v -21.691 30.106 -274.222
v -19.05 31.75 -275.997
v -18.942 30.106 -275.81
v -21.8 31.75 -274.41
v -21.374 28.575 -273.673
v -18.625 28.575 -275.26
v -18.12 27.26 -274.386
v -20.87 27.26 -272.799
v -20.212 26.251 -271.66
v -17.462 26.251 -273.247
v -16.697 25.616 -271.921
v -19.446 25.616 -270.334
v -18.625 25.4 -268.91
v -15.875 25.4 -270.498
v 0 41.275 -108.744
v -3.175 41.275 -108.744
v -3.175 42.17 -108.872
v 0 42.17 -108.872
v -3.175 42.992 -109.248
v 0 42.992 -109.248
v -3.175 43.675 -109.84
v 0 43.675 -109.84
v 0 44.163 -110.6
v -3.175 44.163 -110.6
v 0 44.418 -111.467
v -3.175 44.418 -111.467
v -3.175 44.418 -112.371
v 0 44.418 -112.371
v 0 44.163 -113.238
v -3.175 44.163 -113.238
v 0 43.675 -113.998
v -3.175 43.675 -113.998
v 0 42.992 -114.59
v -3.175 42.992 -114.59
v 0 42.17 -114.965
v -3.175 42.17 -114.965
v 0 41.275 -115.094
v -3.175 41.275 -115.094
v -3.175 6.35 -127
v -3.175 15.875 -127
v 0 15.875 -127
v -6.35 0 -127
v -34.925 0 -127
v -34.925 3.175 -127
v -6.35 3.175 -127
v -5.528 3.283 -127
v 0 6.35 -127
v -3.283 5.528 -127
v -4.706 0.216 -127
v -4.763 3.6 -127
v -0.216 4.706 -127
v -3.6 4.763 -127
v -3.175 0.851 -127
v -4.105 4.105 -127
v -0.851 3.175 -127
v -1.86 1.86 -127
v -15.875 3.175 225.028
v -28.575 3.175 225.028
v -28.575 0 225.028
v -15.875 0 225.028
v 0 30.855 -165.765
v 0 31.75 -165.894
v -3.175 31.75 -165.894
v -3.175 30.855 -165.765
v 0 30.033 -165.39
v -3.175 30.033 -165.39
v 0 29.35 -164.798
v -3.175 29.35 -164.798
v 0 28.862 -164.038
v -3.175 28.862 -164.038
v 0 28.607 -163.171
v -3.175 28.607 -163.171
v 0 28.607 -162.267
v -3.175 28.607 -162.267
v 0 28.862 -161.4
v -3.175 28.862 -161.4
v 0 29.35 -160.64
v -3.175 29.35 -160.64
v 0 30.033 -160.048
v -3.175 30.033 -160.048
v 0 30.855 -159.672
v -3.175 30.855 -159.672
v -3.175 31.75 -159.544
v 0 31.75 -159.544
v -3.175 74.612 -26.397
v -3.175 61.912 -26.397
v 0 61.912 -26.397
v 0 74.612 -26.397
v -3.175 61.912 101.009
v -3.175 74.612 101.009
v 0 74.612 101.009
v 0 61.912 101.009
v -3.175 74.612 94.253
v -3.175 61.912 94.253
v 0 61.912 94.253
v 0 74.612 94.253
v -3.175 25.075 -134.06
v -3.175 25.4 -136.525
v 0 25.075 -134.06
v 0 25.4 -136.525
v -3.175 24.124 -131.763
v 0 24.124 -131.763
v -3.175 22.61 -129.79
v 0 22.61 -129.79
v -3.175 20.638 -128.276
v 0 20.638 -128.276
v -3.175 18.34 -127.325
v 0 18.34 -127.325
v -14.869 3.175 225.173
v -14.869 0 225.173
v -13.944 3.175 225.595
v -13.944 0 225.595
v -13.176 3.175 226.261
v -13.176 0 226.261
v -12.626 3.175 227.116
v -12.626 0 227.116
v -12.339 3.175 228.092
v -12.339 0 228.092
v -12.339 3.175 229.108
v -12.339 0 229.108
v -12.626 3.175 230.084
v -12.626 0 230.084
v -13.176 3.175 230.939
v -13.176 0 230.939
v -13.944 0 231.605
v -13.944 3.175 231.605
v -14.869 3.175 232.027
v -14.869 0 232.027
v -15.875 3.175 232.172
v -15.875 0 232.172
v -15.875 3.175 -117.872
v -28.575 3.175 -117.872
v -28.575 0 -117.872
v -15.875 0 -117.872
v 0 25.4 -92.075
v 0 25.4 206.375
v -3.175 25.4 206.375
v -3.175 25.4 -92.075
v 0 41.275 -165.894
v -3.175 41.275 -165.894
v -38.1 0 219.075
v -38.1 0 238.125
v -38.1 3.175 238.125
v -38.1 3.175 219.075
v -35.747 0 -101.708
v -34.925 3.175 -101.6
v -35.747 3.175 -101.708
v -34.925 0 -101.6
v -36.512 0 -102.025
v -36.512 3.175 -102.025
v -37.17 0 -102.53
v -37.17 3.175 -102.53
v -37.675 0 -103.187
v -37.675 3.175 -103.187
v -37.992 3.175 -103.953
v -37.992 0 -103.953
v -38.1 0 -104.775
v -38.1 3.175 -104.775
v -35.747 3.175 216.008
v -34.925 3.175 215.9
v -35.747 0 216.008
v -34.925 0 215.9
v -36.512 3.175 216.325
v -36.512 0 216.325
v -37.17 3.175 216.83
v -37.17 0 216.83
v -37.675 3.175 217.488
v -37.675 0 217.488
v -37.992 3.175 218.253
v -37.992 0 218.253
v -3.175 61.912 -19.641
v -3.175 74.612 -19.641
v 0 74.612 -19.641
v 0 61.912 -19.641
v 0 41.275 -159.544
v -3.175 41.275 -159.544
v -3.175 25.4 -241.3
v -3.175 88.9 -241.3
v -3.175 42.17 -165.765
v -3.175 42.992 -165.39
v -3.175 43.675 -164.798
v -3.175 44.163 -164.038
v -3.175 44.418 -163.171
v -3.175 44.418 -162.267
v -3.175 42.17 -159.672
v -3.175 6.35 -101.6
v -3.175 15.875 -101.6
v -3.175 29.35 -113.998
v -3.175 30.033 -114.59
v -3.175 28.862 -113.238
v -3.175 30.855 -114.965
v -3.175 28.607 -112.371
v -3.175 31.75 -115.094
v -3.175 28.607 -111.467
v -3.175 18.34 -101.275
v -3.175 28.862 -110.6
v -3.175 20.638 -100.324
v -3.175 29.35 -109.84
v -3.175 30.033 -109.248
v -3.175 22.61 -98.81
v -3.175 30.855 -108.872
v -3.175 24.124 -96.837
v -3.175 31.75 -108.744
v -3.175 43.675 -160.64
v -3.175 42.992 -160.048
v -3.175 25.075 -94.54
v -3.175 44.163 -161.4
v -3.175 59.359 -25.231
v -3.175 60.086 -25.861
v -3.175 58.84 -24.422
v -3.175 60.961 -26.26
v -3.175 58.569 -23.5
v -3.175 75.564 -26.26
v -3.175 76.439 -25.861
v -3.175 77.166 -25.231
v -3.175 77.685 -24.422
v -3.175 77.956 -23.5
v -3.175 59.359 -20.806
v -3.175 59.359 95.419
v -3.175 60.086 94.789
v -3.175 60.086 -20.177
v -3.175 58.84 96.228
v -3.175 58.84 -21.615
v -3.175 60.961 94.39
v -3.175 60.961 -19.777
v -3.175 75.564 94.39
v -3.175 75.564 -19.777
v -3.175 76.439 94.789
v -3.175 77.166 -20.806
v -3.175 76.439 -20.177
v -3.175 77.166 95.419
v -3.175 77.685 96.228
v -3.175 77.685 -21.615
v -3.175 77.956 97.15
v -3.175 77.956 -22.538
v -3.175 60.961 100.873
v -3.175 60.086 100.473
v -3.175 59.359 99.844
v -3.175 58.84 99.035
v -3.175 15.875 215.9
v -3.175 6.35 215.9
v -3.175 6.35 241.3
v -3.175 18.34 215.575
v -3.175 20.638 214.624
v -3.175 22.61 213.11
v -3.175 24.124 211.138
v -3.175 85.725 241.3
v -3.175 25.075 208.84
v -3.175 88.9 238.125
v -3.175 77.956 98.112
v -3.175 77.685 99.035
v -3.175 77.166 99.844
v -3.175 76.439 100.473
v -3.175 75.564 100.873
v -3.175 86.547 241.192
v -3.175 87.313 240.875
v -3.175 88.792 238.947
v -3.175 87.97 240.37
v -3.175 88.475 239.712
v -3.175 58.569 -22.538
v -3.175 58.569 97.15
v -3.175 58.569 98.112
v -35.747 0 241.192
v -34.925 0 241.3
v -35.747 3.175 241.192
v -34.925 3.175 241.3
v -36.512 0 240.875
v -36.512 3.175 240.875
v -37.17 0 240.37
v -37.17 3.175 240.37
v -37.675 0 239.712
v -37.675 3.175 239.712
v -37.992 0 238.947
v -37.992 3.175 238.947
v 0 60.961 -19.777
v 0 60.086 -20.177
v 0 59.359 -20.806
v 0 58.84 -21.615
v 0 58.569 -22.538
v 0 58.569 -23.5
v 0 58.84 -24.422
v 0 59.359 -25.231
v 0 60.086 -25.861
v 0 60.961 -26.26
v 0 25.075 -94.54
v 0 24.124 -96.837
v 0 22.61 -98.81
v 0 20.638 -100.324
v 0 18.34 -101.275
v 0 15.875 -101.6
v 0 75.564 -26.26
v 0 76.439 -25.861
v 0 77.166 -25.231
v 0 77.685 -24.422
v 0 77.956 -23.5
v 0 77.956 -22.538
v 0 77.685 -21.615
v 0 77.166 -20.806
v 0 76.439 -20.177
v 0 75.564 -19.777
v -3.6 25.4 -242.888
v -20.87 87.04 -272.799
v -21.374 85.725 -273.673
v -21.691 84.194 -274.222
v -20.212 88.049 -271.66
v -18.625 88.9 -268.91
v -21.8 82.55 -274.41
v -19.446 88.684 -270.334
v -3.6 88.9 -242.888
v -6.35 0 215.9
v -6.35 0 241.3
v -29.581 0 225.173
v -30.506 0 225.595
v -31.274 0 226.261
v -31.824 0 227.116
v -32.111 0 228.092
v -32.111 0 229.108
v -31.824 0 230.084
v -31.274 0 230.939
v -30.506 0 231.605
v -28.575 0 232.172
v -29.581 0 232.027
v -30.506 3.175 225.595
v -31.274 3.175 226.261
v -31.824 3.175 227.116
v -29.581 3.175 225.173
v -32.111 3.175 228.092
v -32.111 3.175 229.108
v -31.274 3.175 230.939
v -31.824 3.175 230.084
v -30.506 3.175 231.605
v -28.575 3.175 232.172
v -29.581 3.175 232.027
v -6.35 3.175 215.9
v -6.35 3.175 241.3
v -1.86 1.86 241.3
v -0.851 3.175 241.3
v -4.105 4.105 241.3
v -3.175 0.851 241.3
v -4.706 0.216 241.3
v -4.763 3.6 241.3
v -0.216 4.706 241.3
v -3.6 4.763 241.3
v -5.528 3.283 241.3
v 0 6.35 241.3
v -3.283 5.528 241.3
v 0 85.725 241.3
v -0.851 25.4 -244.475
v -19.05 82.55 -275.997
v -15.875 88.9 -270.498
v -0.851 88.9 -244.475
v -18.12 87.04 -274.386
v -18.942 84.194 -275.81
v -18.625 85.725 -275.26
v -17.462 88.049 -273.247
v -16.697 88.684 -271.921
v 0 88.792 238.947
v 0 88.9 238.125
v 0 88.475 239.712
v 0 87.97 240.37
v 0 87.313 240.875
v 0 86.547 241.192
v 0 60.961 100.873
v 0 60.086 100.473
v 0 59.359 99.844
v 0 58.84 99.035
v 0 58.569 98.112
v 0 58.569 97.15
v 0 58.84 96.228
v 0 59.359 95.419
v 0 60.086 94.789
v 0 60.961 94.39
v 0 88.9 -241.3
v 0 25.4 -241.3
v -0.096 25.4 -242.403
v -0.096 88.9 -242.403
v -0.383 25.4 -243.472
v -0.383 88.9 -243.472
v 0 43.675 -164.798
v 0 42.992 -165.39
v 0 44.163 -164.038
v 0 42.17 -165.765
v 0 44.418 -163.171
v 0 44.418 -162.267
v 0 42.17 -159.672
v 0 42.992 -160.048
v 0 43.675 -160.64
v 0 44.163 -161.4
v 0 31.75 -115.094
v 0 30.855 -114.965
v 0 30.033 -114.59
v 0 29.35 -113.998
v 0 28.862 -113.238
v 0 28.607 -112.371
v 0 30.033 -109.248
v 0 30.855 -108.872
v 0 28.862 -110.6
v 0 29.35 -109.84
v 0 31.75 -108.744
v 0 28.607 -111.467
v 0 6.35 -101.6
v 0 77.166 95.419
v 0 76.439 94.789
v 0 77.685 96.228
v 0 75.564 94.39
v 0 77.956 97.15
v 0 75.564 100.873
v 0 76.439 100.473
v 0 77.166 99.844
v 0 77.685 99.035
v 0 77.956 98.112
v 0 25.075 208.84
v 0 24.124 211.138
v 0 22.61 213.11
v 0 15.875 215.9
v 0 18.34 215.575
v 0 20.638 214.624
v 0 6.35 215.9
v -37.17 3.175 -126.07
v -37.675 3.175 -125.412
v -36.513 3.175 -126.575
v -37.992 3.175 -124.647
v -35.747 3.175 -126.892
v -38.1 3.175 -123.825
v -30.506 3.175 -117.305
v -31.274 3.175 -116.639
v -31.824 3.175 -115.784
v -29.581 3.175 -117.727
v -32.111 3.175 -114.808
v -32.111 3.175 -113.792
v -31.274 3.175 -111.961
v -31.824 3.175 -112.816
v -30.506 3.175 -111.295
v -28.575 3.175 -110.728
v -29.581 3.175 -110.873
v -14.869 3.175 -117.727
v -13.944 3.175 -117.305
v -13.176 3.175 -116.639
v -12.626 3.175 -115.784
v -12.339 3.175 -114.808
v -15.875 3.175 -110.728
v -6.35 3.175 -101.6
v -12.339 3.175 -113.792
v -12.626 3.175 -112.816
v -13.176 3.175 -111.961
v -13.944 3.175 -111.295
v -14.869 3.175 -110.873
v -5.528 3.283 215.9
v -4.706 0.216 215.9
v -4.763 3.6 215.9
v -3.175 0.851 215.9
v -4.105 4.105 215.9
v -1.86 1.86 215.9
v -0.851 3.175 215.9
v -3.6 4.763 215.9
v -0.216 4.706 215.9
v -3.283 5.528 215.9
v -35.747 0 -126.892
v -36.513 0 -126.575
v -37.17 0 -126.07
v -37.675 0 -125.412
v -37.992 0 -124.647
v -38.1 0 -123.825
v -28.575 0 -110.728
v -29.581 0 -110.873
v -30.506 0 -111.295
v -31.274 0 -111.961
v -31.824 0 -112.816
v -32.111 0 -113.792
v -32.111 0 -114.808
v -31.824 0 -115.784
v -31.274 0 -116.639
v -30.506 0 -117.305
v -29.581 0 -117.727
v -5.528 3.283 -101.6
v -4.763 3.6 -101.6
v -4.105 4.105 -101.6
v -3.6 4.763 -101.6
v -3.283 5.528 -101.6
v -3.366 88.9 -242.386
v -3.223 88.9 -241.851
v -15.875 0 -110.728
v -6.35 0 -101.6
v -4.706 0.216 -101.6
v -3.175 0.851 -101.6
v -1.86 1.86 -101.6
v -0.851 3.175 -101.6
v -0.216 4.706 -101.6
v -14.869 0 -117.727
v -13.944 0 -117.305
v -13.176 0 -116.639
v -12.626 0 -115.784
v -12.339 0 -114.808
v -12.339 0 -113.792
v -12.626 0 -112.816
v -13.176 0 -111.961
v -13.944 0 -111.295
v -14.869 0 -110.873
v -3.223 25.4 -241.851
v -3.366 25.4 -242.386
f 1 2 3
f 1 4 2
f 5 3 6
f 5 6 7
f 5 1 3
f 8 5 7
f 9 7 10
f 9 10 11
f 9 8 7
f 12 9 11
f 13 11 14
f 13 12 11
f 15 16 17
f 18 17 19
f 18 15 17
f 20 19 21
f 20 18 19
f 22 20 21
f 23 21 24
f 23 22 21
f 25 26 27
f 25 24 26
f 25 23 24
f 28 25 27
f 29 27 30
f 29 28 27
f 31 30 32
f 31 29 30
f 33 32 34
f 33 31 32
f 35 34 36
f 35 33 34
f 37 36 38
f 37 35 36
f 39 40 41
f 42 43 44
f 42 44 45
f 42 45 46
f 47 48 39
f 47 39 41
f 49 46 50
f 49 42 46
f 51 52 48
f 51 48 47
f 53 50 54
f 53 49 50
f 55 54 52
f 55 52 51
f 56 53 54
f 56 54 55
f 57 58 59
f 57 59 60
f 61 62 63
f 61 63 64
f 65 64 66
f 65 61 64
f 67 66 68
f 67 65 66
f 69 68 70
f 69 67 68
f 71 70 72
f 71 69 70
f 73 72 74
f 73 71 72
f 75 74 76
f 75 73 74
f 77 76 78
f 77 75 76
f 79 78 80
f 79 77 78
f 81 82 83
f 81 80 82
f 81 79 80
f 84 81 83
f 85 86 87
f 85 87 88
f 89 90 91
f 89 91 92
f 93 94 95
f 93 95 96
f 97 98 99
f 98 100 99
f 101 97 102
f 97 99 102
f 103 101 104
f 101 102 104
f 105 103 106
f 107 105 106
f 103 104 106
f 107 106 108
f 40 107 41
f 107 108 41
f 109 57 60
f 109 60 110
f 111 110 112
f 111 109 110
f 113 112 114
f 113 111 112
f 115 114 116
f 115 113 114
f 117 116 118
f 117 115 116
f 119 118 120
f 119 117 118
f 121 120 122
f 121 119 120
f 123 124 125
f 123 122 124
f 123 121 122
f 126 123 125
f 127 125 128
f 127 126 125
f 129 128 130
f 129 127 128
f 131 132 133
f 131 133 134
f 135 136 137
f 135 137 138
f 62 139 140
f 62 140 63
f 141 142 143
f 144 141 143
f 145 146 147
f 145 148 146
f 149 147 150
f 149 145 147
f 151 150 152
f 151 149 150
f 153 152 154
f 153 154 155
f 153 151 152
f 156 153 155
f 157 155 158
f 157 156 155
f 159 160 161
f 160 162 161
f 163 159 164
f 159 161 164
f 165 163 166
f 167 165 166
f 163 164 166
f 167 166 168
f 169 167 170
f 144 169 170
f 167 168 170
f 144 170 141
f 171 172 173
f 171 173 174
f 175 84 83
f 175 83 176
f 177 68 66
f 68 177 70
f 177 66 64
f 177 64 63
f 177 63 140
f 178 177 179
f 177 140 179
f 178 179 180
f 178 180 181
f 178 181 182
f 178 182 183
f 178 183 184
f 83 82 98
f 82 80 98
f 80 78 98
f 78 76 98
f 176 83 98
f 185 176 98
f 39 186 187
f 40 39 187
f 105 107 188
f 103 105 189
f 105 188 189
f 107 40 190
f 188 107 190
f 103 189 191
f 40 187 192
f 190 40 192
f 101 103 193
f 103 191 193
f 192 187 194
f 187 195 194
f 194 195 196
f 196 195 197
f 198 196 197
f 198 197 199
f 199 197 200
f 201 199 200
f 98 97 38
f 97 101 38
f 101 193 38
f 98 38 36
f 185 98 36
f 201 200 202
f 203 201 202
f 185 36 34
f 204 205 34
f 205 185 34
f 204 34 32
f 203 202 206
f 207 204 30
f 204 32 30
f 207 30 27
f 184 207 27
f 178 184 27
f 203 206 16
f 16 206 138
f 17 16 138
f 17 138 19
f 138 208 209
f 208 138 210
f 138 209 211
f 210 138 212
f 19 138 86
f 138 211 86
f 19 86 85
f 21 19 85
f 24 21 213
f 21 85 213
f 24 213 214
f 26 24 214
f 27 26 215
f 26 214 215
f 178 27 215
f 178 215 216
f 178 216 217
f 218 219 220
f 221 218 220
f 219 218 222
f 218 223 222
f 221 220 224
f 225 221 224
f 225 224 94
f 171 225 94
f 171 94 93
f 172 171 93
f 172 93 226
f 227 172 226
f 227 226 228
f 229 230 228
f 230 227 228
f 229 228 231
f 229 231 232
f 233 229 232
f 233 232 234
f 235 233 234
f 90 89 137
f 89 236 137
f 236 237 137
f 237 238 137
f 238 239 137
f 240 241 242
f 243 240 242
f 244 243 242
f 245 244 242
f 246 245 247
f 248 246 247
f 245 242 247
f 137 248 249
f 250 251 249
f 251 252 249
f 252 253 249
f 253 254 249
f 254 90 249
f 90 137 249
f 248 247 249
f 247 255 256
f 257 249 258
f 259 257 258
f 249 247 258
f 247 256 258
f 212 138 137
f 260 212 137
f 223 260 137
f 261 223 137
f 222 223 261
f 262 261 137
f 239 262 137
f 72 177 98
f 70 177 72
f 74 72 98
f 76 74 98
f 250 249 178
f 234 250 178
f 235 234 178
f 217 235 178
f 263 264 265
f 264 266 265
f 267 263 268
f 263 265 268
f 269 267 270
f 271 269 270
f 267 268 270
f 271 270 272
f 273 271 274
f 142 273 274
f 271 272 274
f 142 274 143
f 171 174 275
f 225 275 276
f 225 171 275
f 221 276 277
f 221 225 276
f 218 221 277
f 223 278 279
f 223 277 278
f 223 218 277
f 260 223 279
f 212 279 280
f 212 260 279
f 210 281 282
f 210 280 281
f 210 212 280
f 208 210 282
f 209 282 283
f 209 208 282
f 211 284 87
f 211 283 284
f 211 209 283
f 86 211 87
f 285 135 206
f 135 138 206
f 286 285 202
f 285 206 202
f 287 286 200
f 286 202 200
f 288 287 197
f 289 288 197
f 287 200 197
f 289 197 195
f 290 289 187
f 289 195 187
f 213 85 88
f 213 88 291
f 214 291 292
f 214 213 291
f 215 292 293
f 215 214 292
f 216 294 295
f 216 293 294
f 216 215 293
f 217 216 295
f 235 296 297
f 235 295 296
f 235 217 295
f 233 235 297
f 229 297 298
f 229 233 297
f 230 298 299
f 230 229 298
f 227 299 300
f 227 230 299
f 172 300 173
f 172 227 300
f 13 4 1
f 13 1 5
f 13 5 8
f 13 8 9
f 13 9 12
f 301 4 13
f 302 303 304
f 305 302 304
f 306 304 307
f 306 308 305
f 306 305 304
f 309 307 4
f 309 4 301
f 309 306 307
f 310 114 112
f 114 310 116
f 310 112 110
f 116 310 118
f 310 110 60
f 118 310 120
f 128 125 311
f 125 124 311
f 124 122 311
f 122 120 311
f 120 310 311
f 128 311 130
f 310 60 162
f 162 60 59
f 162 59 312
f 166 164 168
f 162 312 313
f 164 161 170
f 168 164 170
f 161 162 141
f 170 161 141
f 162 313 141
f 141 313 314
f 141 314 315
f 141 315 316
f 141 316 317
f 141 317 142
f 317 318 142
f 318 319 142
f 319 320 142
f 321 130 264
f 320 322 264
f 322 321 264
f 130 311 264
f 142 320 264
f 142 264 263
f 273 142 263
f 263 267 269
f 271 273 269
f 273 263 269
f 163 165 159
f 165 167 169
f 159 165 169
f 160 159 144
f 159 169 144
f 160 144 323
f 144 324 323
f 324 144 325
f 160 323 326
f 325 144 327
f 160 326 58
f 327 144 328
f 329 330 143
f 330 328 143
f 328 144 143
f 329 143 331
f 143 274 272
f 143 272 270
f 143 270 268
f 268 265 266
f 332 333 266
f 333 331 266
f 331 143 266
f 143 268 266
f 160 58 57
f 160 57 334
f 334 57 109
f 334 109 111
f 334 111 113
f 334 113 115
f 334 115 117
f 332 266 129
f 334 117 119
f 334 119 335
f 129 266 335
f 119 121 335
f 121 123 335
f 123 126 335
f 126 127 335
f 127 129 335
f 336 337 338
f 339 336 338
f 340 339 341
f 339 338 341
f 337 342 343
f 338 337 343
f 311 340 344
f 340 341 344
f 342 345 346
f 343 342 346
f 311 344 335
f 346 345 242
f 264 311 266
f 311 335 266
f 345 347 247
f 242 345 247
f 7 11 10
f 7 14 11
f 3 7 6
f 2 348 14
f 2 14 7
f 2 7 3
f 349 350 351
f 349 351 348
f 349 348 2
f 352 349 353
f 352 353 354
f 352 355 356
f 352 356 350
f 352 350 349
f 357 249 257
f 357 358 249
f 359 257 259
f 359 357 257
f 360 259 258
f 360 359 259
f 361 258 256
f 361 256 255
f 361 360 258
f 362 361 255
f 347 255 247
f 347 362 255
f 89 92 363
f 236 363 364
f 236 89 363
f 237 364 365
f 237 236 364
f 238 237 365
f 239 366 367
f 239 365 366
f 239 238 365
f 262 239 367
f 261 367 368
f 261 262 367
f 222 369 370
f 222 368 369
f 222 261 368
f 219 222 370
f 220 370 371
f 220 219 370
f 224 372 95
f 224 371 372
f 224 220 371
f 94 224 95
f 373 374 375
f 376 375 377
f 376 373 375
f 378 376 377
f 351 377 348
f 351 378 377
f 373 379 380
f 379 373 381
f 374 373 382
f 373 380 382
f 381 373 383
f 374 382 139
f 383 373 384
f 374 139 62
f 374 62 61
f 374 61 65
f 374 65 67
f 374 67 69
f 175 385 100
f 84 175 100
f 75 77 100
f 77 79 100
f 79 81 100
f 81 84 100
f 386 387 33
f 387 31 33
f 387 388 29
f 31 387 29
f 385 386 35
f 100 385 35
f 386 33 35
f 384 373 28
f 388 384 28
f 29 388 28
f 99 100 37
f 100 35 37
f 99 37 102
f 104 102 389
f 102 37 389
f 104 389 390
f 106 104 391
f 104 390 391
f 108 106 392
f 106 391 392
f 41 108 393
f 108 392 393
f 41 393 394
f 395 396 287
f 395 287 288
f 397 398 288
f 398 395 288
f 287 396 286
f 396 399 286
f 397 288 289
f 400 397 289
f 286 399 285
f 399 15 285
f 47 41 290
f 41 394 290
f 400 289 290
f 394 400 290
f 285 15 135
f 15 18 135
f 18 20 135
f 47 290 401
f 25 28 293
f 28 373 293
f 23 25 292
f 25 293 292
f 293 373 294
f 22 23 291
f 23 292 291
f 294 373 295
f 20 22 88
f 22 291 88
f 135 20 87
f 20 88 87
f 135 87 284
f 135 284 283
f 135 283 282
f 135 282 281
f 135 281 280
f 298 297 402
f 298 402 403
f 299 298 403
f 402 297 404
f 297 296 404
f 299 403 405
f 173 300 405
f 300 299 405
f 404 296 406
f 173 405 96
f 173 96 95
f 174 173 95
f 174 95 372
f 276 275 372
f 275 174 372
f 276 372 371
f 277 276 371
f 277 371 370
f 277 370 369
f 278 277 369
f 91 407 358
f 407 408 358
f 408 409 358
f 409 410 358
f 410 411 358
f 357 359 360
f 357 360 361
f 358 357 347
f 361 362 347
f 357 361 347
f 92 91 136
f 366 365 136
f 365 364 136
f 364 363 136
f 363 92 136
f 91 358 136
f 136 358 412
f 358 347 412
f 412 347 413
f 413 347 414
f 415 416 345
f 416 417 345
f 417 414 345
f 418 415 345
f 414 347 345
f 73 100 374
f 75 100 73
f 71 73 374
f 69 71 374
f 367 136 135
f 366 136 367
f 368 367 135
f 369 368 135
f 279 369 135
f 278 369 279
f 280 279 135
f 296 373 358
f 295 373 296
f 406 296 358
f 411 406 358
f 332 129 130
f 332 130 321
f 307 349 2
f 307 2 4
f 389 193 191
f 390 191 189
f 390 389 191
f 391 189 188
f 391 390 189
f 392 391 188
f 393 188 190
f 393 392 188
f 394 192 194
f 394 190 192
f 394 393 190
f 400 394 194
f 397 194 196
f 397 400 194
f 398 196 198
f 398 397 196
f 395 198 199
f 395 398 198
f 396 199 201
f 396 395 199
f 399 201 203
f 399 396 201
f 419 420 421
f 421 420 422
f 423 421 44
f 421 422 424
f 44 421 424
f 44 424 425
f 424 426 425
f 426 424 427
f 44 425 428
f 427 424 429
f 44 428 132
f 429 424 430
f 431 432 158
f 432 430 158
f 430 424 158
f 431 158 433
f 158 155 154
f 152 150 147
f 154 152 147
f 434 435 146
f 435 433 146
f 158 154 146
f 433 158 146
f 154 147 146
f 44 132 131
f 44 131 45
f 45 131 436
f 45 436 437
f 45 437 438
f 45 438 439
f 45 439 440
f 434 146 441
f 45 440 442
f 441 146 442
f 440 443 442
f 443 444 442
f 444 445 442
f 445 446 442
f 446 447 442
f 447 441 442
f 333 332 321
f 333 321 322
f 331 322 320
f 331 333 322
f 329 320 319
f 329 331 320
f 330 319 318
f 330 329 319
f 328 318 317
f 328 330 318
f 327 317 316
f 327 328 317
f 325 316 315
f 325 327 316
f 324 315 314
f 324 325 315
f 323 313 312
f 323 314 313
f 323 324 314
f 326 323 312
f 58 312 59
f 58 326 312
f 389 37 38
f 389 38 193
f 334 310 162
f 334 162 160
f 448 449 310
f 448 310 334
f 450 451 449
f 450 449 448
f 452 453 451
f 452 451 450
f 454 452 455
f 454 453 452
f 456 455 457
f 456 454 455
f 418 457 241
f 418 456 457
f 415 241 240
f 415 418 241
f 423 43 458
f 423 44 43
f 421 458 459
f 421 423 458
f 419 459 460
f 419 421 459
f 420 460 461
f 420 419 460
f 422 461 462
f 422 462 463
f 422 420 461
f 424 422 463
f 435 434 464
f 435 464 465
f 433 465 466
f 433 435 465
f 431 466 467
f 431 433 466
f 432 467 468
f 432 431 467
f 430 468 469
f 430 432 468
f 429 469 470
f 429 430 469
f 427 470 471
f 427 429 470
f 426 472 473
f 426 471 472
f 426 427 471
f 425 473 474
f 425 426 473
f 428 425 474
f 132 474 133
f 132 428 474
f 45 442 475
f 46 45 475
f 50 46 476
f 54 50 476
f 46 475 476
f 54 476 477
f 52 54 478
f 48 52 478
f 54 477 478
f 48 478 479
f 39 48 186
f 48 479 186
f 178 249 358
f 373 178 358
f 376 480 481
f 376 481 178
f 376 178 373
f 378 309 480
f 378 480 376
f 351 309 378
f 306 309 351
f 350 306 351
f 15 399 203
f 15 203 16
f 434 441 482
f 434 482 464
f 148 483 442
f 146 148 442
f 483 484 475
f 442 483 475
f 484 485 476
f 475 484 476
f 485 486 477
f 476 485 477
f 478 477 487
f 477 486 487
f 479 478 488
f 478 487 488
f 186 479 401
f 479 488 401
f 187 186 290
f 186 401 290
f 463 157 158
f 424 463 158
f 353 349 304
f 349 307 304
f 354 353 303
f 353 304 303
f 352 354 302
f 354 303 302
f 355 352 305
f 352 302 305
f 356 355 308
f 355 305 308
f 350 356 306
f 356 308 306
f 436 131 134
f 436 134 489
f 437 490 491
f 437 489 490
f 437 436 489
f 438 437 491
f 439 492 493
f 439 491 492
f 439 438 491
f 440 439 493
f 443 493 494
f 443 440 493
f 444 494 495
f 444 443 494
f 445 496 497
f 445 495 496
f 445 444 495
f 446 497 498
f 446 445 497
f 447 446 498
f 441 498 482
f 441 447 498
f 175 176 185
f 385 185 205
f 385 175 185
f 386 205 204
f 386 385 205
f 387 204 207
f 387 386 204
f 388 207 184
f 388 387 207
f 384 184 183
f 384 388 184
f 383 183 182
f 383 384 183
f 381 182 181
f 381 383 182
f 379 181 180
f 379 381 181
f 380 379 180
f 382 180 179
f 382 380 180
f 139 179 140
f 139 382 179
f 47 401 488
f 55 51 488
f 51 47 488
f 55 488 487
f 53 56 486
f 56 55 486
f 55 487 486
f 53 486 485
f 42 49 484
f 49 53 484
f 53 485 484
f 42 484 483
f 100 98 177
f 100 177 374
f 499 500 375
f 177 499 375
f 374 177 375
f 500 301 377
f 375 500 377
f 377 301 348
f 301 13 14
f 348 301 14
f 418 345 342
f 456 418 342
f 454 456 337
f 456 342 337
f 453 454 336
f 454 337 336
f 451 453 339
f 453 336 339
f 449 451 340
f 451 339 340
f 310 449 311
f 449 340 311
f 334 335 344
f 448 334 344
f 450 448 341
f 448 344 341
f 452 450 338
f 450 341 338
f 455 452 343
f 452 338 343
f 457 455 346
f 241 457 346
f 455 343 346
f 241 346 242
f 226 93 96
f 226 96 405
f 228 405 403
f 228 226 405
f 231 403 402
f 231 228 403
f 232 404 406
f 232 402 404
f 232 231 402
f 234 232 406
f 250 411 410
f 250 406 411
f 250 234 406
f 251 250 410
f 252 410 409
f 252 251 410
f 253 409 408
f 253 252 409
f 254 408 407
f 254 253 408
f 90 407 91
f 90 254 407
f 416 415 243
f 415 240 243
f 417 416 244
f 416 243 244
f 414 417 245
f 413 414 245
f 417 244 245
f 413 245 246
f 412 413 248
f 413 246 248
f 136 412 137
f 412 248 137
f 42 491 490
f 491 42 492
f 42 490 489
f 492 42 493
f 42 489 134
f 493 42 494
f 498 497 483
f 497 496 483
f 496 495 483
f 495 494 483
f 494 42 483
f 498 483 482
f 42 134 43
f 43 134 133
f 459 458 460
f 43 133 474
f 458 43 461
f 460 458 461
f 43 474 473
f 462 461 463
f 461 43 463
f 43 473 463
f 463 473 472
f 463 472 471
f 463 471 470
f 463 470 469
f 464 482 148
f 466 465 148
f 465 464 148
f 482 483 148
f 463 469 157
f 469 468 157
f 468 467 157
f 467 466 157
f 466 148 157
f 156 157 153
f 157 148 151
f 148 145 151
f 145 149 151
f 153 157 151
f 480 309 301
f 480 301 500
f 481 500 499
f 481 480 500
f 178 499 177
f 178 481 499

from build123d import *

# Parameters (mm, degrees)
BASE_FLANGE1_DEPTH             = 241.3
SKETCH7_W                      = 38.1
SKETCH7_H                      = 114.3
CUT_EXTRUDE2_DEPTH             = 25.4
EDGE_FLANGE1_DEPTH             = 63.5
FILLET2_R                      = 6.35
F_3_16_0_1875_DIAMETER_HOLE2_D = 4.7625
CUT_EXTRUDE1_REACH             = 293.504
CUT_EXTRUDE3_REACH             = 294.454
CUT_EXTRUDE4_REACH             = 294.454
SKETCH12_W                     = 317.5
SKETCH12_H                     = 25.4
FILLET1_R                      = 3.175
FILLET3_R                      = 9.525
CUT_EXTRUDE5_REACH             = 294.057


# Sheet-metal steps are written as plain solids
with BuildPart() as part:
    # Sketch1 → Base-Flange1 (new, symmetric)
    with BuildSketch(Plane.XY):
        with BuildLine():
            Line((0, 88.9), (0, 6.35))
            ThreePointArc((0, 6.35), (-1.859871939, 1.859871939), (-6.35, 0))
            Line((-6.35, 0), (-38.1, 0))
            Line((-38.1, 0), (-38.1, 3.175))
            Line((-38.1, 3.175), (-6.35, 3.175))
            ThreePointArc((-6.35, 3.175), (-4.10493597, 4.10493597), (-3.175, 6.35))
            Line((-3.175, 6.35), (-3.175, 88.9))
            Line((-3.175, 88.9), (0, 88.9))
        make_face()
    extrude(amount=BASE_FLANGE1_DEPTH, both=True)

    # Sketch7 → Cut-Extrude2 (cut)
    with BuildSketch(Plane.XZ):
        with Locations((-19.05, -184.15)):
            Rectangle(SKETCH7_W, SKETCH7_H)
    extrude(amount=-CUT_EXTRUDE2_DEPTH, mode=Mode.SUBTRACT)

    # Edge-Flange1 section (across the edge) → Edge-Flange1 (add)
    with BuildSketch(Plane(origin=(-3.175, 88.9, -242.150738686), x_dir=(-0.8660254037844416, 0, 0.49999999999999495), z_dir=(0, -1, 0))):
        with BuildLine():
            Line((-3.175, 0.850738686), (-3.175, 37.249261314))
            Line((-3.175, 37.249261314), (0, 37.249261314))
            Line((0, 37.249261314), (0, 0.850738686))
            ThreePointArc((0, 0.850738686), (0.108185502, 0.028988218), (0.425369343, -0.736761314))
            Line((0.425369343, -0.736761314), (-2.324261314, -2.324261314))
            ThreePointArc((-2.324261314, -2.324261314), (-2.958628997, -0.79276225), (-3.175, 0.850738686))
        make_face()
    extrude(amount=EDGE_FLANGE1_DEPTH)

    # Fillet2
    fillet2_edges = [part.edges().sort_by_distance(p)[0] for p in [
        (-20.424815329, 88.9, -275.203295256),
        (-20.424815329, 25.4, -275.203295256),
    ]]
    fillet(fillet2_edges, radius=FILLET2_R)

    # 3/16 (0.1875) Diameter Hole2 (through all)
    with Locations(Plane(origin=(0, 0, 0), x_dir=(0, 0, -1), z_dir=(1, 0, 0))):
        with Locations((111.91875, 36.5125), (162.71875, 36.5125)):
            Hole(F_3_16_0_1875_DIAMETER_HOLE2_D / 2)

    # Sketch5 → Cut-Extrude1 (cut, up to next)
    with BuildSketch(Plane(origin=(0, 3.175, 0), x_dir=(-1, 0, 0), z_dir=(0, 1, 0)), mode=Mode.PRIVATE) as cut_extrude1_sk1:
        with BuildLine():
            Line((28.575, -117.871875), (15.875, -117.871875))
            ThreePointArc((15.875, -117.871875), (12.303125, -114.3), (15.875, -110.728125))
            Line((15.875, -110.728125), (28.575, -110.728125))
            ThreePointArc((28.575, -110.728125), (32.146875, -114.3), (28.575, -117.871875))
        make_face()
    cut_extrude1_tool1 = extrude(cut_extrude1_sk1.sketch, amount=-CUT_EXTRUDE1_REACH, mode=Mode.PRIVATE) & part.part
    # Sketch5 → Cut-Extrude1 (cut, up to next)
    with BuildSketch(Plane(origin=(0, 3.175, 0), x_dir=(-1, 0, 0), z_dir=(0, 1, 0)), mode=Mode.PRIVATE) as cut_extrude1_sk2:
        with BuildLine():
            Line((28.575, 225.028125), (15.875, 225.028125))
            ThreePointArc((15.875, 225.028125), (12.303125, 228.6), (15.875, 232.171875))
            Line((15.875, 232.171875), (28.575, 232.171875))
            ThreePointArc((28.575, 232.171875), (32.146875, 228.6), (28.575, 225.028125))
        make_face()
    cut_extrude1_tool2 = extrude(cut_extrude1_sk2.sketch, amount=-CUT_EXTRUDE1_REACH, mode=Mode.PRIVATE) & part.part
    add(cut_extrude1_tool1.solids().sort_by_distance((-22.225, 3.175, -114.3))[0], mode=Mode.SUBTRACT)
    add(cut_extrude1_tool2.solids().sort_by_distance((-22.225, 3.175, 228.6))[0], mode=Mode.SUBTRACT)

    # Sketch11 → Cut-Extrude3 (cut, up to next)
    with BuildSketch(Plane(origin=(0, 0, 0), x_dir=(0, 0, -1), z_dir=(1, 0, 0)), mode=Mode.PRIVATE) as cut_extrude3_sk1:
        with BuildLine():
            Line((115.09375, 41.275), (115.09375, 31.75))
            ThreePointArc((115.09375, 31.75), (111.91875, 28.575), (108.74375, 31.75))
            Line((108.74375, 31.75), (108.74375, 41.275))
            ThreePointArc((108.74375, 41.275), (111.91875, 44.45), (115.09375, 41.275))
        make_face()
    cut_extrude3_tool1 = extrude(cut_extrude3_sk1.sketch, amount=-CUT_EXTRUDE3_REACH, mode=Mode.PRIVATE) & part.part
    # Sketch11 → Cut-Extrude3 (cut, up to next)
    with BuildSketch(Plane(origin=(0, 0, 0), x_dir=(0, 0, -1), z_dir=(1, 0, 0)), mode=Mode.PRIVATE) as cut_extrude3_sk2:
        with BuildLine():
            Line((165.89375, 41.275), (165.89375, 31.75))
            ThreePointArc((165.89375, 31.75), (162.71875, 28.575), (159.54375, 31.75))
            Line((159.54375, 31.75), (159.54375, 41.275))
            ThreePointArc((159.54375, 41.275), (162.71875, 44.45), (165.89375, 41.275))
        make_face()
    cut_extrude3_tool2 = extrude(cut_extrude3_sk2.sketch, amount=-CUT_EXTRUDE3_REACH, mode=Mode.PRIVATE) & part.part
    add(cut_extrude3_tool1.solids().sort_by_distance((0, 36.5125, -111.91875))[0], mode=Mode.SUBTRACT)
    add(cut_extrude3_tool2.solids().sort_by_distance((0, 36.5125, -162.71875))[0], mode=Mode.SUBTRACT)

    # Sketch12 → Cut-Extrude4 (cut, up to next)
    with BuildSketch(Plane(origin=(0, 0, 0), x_dir=(0, 0, -1), z_dir=(1, 0, 0)), mode=Mode.PRIVATE) as cut_extrude4_sk1:
        with Locations((-57.15, 12.7)):
            Rectangle(SKETCH12_W, SKETCH12_H)
    cut_extrude4_tool1 = extrude(cut_extrude4_sk1.sketch, amount=-CUT_EXTRUDE4_REACH, mode=Mode.PRIVATE) & part.part
    add(cut_extrude4_tool1.solids().sort_by_distance((0, 12.7, 57.15))[0], mode=Mode.SUBTRACT)

    # Fillet1
    fillet1_edges = [part.edges().sort_by_distance(p)[0] for p in [
        (-38.1, 1.5875, 215.9),
        (-38.1, 1.5875, -101.6),
        (-1.5875, 88.9, 241.3),
        (-38.1, 1.5875, -127),
        (-38.1, 1.5875, 241.3),
    ]]
    fillet(fillet1_edges, radius=FILLET1_R)

    # Fillet3
    fillet3_edges = [part.edges().sort_by_distance(p)[0] for p in [
        (-1.5875, 25.4, 215.9),
        (-1.5875, 25.4, -101.6),
        (-1.5875, 25.4, -127),
    ]]
    fillet(fillet3_edges, radius=FILLET3_R)

    # Sketch13 → Cut-Extrude5 (cut, up to next)
    with BuildSketch(Plane.ZY.offset(3.175), mode=Mode.PRIVATE) as cut_extrude5_sk1:
        with BuildLine():
            Line((-19.64055, 74.6125), (-19.64055, 61.9125))
            ThreePointArc((-19.64055, 61.9125), (-23.01875, 58.5343), (-26.39695, 61.9125))
            Line((-26.39695, 61.9125), (-26.39695, 74.6125))
            ThreePointArc((-26.39695, 74.6125), (-23.01875, 77.9907), (-19.64055, 74.6125))
        make_face()
    cut_extrude5_tool1 = extrude(cut_extrude5_sk1.sketch, amount=-CUT_EXTRUDE5_REACH, mode=Mode.PRIVATE) & part.part
    # Sketch13 → Cut-Extrude5 (cut, up to next)
    with BuildSketch(Plane.ZY.offset(3.175), mode=Mode.PRIVATE) as cut_extrude5_sk2:
        with BuildLine():
            Line((101.00945, 74.6125), (101.00945, 61.9125))
            ThreePointArc((101.00945, 61.9125), (97.63125, 58.5343), (94.25305, 61.9125))
            Line((94.25305, 61.9125), (94.25305, 74.6125))
            ThreePointArc((94.25305, 74.6125), (97.63125, 77.9907), (101.00945, 74.6125))
        make_face()
    cut_extrude5_tool2 = extrude(cut_extrude5_sk2.sketch, amount=-CUT_EXTRUDE5_REACH, mode=Mode.PRIVATE) & part.part
    add(cut_extrude5_tool1.solids().sort_by_distance((-3.175, 68.2625, -23.01875))[0], mode=Mode.SUBTRACT)
    add(cut_extrude5_tool2.solids().sort_by_distance((-3.175, 68.2625, 97.63125))[0], mode=Mode.SUBTRACT)


solid = part.part
